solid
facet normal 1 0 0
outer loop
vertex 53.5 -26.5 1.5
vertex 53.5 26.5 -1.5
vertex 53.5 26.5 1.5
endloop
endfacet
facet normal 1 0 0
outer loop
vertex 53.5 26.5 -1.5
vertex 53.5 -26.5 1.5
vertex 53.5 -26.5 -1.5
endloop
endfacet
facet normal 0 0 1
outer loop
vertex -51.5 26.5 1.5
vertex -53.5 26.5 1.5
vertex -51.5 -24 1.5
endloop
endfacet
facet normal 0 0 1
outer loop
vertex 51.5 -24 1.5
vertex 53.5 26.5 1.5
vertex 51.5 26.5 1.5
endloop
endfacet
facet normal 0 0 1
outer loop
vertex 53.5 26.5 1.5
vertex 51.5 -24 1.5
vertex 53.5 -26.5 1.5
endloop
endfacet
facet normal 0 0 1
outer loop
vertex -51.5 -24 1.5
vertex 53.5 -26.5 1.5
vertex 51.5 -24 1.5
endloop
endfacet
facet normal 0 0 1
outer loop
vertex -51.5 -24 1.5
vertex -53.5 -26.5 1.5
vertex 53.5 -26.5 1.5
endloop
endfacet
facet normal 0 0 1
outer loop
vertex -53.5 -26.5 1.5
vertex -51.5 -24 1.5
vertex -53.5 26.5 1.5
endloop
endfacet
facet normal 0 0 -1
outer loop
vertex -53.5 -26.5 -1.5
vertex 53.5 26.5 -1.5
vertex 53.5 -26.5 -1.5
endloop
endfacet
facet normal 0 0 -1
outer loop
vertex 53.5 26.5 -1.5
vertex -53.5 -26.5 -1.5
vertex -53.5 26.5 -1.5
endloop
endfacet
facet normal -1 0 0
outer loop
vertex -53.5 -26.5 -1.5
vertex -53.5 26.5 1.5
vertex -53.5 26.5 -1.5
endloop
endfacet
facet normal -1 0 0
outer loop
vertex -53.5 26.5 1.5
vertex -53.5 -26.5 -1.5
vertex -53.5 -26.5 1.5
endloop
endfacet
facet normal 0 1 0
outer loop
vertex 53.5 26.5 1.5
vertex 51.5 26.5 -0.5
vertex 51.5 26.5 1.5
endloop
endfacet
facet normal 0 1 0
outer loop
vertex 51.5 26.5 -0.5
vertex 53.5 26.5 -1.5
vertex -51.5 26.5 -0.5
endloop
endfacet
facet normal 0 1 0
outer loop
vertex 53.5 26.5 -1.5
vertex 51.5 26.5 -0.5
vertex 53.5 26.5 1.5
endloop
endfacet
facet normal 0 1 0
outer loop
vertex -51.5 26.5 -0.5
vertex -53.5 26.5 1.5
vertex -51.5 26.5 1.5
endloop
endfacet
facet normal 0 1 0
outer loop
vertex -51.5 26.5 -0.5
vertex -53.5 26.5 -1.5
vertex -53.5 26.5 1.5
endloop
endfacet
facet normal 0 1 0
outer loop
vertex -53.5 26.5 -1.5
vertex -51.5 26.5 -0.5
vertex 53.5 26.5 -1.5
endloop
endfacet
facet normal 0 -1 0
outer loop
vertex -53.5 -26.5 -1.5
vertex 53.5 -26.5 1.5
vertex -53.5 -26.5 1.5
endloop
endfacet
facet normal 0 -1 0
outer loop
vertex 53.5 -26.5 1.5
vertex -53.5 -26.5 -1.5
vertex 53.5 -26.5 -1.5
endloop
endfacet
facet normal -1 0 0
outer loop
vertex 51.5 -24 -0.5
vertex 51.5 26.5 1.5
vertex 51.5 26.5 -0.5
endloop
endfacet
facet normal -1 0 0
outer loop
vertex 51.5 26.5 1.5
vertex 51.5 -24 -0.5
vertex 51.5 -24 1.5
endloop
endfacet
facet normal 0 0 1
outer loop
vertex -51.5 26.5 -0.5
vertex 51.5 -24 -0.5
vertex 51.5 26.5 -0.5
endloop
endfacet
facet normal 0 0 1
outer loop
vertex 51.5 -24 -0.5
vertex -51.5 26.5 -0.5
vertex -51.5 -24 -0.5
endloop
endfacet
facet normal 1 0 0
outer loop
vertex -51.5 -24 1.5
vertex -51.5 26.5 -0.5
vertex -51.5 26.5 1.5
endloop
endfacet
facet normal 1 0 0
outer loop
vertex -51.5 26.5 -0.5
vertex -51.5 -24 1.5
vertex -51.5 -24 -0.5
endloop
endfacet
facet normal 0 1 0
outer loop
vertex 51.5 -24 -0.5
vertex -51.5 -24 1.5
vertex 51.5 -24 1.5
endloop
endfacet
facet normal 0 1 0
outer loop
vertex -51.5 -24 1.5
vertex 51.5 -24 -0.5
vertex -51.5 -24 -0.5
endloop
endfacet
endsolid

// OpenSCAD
// Width of the tray as it faces the enemy?
tray_width = 107; // [50:1000]
// Depth of the tray away from the enemy?
tray_depth = 53; // [25:500]
// Edge height of tray?
edge_height = 3;  // [2:5]
// How wide is the edge?
edge_width = 2; // [1:5]

difference () {

    cube ( [tray_width, tray_depth, edge_height], center=true ) ;

    translate ([0,edge_width,1]) {
        cube ( [tray_width-edge_width*2, tray_depth-edge_width+1, edge_height], center=true ) ;
    }
}
